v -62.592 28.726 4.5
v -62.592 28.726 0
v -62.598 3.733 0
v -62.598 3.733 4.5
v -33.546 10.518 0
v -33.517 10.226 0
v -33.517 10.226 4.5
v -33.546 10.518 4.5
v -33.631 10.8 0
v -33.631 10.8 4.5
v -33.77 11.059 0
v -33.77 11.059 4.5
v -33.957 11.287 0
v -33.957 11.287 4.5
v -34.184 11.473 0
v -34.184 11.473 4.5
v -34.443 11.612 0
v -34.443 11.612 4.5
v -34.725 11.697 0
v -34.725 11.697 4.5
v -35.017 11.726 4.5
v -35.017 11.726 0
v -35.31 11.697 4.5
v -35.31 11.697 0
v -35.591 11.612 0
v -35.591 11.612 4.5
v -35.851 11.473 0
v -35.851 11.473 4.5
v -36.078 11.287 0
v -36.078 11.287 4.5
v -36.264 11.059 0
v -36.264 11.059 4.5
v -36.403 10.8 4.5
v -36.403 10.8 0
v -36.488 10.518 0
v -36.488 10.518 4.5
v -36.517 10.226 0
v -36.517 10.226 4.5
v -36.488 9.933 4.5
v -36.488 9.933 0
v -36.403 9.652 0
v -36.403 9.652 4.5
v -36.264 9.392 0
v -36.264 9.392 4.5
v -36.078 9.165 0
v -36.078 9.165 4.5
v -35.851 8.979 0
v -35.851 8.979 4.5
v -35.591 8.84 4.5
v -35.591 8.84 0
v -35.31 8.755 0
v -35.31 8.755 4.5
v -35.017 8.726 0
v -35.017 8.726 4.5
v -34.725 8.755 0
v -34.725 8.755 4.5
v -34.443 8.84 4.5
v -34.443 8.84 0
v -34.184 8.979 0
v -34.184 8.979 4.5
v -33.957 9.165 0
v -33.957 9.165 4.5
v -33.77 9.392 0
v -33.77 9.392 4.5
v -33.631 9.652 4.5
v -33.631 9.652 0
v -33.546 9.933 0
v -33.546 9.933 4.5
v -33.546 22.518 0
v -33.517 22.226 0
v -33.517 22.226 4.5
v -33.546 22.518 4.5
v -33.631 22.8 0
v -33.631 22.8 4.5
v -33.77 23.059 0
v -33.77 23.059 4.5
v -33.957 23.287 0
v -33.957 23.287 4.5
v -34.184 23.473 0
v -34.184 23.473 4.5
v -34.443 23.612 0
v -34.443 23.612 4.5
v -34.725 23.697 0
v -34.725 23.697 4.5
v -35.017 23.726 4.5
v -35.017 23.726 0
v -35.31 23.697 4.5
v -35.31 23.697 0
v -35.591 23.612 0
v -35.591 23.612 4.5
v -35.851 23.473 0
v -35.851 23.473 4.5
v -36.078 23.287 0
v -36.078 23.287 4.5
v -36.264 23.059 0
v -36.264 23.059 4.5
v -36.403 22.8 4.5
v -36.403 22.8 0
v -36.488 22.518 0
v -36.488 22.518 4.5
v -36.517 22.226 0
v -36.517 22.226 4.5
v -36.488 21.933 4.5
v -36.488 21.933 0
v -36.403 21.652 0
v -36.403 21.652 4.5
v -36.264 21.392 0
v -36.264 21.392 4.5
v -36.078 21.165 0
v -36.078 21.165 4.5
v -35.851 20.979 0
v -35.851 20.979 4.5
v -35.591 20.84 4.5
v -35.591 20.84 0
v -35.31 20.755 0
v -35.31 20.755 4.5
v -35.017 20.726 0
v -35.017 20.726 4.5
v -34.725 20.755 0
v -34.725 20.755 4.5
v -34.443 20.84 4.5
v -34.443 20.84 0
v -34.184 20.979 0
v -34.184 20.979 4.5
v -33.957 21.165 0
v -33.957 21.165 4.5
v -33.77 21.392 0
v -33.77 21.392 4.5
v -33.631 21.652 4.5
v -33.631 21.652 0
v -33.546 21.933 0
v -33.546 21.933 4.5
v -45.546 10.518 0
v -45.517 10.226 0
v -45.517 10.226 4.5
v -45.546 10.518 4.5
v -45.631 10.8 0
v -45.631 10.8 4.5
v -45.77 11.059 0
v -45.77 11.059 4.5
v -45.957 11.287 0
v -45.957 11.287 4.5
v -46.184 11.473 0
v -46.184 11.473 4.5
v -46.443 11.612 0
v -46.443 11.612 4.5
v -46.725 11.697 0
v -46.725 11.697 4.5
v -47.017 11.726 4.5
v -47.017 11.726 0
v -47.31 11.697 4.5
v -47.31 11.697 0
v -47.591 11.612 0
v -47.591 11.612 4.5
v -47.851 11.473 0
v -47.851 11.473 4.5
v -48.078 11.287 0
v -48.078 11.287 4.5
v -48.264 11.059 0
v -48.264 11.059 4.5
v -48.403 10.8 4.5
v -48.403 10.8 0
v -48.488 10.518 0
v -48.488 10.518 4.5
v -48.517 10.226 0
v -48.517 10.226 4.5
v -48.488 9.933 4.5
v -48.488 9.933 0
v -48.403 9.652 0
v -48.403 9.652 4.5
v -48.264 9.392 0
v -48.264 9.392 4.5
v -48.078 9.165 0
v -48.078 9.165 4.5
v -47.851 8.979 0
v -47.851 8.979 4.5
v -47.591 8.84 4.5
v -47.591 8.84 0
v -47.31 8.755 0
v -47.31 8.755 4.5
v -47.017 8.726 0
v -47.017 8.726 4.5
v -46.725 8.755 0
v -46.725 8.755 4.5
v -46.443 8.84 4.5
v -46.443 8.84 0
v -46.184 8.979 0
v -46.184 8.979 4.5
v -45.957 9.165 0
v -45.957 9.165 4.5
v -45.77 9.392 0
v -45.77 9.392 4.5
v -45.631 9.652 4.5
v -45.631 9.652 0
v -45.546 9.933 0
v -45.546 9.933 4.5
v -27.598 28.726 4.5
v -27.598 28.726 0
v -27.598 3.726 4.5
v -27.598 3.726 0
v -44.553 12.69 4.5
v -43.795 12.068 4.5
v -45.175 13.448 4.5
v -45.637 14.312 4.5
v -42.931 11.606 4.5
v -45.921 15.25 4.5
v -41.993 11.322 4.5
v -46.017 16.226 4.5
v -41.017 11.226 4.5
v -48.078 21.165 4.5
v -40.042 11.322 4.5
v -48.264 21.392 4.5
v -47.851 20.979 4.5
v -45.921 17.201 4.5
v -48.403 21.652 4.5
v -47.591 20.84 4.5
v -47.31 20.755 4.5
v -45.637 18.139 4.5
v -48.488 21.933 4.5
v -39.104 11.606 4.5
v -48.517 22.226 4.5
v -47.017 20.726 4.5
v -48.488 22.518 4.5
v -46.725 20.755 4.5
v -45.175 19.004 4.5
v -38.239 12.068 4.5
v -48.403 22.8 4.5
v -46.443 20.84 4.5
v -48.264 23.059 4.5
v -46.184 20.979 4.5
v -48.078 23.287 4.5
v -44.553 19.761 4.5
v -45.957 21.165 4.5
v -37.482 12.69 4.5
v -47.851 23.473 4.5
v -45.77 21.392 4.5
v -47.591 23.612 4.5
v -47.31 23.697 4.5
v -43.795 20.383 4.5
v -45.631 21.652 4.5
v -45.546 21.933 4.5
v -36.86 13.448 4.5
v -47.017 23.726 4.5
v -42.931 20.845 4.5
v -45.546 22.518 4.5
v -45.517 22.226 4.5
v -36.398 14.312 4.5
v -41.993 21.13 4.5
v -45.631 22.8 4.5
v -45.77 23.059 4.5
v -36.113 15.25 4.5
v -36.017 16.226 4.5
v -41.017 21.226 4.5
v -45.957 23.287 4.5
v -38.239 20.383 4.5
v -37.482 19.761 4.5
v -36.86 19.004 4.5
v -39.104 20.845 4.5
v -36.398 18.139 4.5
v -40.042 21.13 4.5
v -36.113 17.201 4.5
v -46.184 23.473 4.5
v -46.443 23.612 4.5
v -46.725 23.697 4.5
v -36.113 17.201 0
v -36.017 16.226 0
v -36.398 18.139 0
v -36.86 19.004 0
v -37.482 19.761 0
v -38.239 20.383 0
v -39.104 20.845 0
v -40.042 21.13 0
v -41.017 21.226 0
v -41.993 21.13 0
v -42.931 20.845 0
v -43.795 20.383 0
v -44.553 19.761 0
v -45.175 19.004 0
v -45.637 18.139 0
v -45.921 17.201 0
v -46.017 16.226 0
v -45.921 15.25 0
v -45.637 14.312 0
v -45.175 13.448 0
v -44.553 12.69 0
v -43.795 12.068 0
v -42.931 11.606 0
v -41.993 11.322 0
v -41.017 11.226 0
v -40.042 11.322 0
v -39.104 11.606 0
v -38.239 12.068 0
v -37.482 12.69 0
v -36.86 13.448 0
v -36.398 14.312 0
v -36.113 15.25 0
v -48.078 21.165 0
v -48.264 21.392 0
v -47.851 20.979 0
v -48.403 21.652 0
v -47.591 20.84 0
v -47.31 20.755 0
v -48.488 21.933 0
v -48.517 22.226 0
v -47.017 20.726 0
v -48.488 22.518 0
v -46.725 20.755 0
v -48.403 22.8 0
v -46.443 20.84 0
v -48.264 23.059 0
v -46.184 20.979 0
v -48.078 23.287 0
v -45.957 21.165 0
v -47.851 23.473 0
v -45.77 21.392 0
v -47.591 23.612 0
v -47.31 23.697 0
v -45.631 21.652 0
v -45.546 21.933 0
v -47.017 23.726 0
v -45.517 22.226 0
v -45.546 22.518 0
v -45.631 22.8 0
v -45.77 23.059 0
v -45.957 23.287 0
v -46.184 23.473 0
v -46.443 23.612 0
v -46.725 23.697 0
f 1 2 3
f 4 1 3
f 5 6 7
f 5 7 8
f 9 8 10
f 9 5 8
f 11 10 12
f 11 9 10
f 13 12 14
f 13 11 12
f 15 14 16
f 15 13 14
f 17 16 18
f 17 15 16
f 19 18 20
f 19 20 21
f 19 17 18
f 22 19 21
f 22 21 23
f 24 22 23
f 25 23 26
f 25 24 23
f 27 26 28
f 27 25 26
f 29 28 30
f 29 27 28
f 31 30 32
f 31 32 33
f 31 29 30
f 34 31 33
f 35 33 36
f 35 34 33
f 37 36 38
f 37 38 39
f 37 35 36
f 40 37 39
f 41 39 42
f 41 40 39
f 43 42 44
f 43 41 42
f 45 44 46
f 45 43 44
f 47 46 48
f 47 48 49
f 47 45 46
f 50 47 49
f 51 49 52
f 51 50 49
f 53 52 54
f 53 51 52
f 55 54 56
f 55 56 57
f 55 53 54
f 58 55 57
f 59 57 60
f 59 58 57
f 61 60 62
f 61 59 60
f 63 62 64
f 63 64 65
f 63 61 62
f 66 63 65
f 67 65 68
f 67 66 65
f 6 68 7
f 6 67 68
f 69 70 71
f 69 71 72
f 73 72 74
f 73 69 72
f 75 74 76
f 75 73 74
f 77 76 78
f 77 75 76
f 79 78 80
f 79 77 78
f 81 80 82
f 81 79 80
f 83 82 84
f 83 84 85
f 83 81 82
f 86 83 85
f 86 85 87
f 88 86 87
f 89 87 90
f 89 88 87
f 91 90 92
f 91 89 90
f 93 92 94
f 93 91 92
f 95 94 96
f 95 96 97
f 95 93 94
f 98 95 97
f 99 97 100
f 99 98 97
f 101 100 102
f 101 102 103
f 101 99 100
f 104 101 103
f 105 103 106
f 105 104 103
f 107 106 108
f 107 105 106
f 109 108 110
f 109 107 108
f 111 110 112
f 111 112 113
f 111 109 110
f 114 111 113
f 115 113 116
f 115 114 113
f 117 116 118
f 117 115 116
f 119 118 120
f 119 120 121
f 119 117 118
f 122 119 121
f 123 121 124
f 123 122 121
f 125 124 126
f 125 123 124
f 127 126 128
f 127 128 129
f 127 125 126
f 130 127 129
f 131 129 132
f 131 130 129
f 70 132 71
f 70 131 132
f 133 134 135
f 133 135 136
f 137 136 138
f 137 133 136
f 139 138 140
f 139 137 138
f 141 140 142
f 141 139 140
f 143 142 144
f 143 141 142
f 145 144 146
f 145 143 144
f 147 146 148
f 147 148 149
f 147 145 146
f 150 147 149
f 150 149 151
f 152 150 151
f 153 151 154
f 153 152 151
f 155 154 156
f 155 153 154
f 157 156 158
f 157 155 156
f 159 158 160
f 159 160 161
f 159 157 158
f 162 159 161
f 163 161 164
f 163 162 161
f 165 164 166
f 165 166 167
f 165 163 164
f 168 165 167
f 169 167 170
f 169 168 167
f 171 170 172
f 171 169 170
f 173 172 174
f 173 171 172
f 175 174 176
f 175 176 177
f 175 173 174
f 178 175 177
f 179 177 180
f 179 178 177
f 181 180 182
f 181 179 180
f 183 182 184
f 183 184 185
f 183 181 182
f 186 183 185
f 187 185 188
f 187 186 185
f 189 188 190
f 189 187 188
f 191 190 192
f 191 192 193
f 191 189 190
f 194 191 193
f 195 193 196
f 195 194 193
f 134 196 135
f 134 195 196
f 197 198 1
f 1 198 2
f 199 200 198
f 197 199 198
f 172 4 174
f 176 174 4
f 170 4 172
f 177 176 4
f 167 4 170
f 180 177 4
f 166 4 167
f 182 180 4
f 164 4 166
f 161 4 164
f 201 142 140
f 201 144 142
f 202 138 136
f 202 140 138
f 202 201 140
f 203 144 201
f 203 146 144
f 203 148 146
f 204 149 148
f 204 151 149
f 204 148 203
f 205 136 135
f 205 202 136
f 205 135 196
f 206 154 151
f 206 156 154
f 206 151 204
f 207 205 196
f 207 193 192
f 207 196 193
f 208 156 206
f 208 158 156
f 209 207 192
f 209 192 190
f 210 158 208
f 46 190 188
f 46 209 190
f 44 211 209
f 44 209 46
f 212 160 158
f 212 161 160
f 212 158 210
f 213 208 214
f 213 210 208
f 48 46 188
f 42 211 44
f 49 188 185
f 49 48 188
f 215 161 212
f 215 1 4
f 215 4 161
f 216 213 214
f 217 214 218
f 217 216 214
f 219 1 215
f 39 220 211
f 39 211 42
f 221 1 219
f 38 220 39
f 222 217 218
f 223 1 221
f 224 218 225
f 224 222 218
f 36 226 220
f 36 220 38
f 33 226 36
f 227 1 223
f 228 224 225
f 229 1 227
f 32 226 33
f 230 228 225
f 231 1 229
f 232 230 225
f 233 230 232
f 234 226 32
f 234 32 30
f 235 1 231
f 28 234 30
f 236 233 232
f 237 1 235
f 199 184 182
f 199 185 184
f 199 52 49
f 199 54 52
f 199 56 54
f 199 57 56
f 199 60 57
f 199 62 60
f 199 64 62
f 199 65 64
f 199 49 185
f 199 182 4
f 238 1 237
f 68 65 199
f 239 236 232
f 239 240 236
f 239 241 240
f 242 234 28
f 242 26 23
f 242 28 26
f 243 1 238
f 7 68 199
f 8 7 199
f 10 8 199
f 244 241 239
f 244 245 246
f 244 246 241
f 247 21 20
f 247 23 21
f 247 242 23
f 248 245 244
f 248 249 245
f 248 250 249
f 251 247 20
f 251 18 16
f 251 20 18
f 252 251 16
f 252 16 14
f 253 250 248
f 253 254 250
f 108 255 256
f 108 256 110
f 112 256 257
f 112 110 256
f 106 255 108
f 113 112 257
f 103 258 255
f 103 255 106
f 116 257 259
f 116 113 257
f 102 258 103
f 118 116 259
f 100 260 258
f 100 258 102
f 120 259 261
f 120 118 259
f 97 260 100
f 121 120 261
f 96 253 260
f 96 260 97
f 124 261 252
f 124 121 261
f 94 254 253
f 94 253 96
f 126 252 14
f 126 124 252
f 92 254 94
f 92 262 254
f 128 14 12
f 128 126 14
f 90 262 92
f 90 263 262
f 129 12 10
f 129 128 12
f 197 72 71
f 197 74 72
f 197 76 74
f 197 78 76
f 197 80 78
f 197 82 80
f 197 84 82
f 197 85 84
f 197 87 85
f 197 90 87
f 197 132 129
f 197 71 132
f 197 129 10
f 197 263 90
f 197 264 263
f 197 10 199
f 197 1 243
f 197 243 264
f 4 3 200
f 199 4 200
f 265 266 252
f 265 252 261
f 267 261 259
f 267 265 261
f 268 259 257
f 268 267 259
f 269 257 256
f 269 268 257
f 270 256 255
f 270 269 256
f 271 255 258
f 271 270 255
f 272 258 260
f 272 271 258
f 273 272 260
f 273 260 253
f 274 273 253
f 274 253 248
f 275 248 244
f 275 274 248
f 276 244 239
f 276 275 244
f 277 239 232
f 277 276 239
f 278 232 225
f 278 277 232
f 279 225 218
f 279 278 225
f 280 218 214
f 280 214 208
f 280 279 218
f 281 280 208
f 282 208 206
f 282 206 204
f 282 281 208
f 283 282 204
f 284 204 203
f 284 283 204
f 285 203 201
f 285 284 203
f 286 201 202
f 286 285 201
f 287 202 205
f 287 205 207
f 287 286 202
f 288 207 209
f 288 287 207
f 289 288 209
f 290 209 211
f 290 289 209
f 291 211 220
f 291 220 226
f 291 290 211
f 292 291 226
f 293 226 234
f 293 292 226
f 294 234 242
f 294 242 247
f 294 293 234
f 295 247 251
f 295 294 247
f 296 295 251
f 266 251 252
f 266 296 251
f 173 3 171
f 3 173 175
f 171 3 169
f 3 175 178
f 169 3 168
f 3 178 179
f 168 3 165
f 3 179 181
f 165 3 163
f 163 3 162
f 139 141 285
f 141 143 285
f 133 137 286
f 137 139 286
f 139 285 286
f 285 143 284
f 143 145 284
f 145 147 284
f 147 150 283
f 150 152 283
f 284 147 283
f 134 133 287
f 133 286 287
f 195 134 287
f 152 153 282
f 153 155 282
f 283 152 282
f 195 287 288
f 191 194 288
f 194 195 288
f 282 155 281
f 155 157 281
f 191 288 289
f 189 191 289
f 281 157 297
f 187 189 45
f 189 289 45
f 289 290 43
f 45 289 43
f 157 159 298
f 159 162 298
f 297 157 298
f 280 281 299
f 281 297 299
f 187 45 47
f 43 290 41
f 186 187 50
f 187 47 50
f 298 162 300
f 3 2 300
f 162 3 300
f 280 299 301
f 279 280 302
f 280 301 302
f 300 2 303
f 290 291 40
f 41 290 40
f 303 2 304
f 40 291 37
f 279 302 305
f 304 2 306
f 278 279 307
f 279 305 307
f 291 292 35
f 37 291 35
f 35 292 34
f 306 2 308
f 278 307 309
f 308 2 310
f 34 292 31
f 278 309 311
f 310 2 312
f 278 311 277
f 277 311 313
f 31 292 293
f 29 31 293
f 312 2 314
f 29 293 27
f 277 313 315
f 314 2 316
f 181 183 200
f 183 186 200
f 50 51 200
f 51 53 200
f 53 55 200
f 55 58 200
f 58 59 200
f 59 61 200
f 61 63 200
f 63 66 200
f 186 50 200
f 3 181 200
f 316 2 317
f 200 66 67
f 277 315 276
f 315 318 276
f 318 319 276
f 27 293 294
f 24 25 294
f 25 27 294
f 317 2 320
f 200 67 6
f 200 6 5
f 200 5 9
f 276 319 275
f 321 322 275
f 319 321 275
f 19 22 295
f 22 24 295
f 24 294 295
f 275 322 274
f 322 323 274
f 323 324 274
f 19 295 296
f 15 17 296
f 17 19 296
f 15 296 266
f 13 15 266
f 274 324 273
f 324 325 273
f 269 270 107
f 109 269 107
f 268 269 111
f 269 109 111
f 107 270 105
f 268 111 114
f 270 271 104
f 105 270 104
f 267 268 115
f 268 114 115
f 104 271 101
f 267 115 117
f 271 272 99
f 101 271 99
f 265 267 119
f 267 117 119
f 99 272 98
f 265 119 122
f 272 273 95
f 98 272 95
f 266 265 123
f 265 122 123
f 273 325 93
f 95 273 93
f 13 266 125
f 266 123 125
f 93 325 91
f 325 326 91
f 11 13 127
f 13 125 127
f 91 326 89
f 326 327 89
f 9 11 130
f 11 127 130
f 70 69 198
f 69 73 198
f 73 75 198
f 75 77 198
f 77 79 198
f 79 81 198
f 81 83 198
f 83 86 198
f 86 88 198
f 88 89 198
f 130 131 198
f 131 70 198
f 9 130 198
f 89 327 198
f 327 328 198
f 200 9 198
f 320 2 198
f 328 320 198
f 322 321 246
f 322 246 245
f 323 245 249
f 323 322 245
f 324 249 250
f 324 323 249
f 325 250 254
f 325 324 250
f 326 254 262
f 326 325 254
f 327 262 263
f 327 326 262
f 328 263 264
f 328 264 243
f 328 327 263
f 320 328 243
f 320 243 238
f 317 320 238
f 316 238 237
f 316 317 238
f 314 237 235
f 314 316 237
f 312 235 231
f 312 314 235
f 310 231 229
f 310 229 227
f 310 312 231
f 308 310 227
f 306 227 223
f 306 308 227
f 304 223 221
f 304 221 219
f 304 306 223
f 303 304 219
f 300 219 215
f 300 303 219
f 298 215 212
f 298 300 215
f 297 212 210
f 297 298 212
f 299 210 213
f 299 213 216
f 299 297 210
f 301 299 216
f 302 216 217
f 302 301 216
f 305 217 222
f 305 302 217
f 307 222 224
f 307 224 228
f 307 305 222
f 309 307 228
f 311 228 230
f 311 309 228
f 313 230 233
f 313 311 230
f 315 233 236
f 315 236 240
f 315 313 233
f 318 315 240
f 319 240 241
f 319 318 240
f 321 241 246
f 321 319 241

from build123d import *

# Parameters (mm, degrees)
F0_R     = 1.5
F0_R_2   = 5
F1_DEPTH = 4.5


with BuildPart() as f1:
    # F0 (on Top) → F1 (new body)
    with BuildSketch(Plane.XY):
        Polygon((-27.597585, 28.725847), (-62.592236, 28.725847), (-62.597585, 3.733337), (-27.597585, 3.725847), align=None)
        with Locations((-47.017195, 10.225847)):
            Circle(F0_R, mode=Mode.SUBTRACT)
        with Locations((-41.017195, 16.225847)):
            Circle(F0_R_2, mode=Mode.SUBTRACT)
        with Locations((-35.017195, 10.225847)):
            Circle(F0_R, mode=Mode.SUBTRACT)
        with Locations((-47.017195, 22.225847)):
            Circle(F0_R, mode=Mode.SUBTRACT)
        with Locations((-35.017195, 22.225847)):
            Circle(F0_R, mode=Mode.SUBTRACT)
    extrude(amount=F1_DEPTH)


solid = f1.part
